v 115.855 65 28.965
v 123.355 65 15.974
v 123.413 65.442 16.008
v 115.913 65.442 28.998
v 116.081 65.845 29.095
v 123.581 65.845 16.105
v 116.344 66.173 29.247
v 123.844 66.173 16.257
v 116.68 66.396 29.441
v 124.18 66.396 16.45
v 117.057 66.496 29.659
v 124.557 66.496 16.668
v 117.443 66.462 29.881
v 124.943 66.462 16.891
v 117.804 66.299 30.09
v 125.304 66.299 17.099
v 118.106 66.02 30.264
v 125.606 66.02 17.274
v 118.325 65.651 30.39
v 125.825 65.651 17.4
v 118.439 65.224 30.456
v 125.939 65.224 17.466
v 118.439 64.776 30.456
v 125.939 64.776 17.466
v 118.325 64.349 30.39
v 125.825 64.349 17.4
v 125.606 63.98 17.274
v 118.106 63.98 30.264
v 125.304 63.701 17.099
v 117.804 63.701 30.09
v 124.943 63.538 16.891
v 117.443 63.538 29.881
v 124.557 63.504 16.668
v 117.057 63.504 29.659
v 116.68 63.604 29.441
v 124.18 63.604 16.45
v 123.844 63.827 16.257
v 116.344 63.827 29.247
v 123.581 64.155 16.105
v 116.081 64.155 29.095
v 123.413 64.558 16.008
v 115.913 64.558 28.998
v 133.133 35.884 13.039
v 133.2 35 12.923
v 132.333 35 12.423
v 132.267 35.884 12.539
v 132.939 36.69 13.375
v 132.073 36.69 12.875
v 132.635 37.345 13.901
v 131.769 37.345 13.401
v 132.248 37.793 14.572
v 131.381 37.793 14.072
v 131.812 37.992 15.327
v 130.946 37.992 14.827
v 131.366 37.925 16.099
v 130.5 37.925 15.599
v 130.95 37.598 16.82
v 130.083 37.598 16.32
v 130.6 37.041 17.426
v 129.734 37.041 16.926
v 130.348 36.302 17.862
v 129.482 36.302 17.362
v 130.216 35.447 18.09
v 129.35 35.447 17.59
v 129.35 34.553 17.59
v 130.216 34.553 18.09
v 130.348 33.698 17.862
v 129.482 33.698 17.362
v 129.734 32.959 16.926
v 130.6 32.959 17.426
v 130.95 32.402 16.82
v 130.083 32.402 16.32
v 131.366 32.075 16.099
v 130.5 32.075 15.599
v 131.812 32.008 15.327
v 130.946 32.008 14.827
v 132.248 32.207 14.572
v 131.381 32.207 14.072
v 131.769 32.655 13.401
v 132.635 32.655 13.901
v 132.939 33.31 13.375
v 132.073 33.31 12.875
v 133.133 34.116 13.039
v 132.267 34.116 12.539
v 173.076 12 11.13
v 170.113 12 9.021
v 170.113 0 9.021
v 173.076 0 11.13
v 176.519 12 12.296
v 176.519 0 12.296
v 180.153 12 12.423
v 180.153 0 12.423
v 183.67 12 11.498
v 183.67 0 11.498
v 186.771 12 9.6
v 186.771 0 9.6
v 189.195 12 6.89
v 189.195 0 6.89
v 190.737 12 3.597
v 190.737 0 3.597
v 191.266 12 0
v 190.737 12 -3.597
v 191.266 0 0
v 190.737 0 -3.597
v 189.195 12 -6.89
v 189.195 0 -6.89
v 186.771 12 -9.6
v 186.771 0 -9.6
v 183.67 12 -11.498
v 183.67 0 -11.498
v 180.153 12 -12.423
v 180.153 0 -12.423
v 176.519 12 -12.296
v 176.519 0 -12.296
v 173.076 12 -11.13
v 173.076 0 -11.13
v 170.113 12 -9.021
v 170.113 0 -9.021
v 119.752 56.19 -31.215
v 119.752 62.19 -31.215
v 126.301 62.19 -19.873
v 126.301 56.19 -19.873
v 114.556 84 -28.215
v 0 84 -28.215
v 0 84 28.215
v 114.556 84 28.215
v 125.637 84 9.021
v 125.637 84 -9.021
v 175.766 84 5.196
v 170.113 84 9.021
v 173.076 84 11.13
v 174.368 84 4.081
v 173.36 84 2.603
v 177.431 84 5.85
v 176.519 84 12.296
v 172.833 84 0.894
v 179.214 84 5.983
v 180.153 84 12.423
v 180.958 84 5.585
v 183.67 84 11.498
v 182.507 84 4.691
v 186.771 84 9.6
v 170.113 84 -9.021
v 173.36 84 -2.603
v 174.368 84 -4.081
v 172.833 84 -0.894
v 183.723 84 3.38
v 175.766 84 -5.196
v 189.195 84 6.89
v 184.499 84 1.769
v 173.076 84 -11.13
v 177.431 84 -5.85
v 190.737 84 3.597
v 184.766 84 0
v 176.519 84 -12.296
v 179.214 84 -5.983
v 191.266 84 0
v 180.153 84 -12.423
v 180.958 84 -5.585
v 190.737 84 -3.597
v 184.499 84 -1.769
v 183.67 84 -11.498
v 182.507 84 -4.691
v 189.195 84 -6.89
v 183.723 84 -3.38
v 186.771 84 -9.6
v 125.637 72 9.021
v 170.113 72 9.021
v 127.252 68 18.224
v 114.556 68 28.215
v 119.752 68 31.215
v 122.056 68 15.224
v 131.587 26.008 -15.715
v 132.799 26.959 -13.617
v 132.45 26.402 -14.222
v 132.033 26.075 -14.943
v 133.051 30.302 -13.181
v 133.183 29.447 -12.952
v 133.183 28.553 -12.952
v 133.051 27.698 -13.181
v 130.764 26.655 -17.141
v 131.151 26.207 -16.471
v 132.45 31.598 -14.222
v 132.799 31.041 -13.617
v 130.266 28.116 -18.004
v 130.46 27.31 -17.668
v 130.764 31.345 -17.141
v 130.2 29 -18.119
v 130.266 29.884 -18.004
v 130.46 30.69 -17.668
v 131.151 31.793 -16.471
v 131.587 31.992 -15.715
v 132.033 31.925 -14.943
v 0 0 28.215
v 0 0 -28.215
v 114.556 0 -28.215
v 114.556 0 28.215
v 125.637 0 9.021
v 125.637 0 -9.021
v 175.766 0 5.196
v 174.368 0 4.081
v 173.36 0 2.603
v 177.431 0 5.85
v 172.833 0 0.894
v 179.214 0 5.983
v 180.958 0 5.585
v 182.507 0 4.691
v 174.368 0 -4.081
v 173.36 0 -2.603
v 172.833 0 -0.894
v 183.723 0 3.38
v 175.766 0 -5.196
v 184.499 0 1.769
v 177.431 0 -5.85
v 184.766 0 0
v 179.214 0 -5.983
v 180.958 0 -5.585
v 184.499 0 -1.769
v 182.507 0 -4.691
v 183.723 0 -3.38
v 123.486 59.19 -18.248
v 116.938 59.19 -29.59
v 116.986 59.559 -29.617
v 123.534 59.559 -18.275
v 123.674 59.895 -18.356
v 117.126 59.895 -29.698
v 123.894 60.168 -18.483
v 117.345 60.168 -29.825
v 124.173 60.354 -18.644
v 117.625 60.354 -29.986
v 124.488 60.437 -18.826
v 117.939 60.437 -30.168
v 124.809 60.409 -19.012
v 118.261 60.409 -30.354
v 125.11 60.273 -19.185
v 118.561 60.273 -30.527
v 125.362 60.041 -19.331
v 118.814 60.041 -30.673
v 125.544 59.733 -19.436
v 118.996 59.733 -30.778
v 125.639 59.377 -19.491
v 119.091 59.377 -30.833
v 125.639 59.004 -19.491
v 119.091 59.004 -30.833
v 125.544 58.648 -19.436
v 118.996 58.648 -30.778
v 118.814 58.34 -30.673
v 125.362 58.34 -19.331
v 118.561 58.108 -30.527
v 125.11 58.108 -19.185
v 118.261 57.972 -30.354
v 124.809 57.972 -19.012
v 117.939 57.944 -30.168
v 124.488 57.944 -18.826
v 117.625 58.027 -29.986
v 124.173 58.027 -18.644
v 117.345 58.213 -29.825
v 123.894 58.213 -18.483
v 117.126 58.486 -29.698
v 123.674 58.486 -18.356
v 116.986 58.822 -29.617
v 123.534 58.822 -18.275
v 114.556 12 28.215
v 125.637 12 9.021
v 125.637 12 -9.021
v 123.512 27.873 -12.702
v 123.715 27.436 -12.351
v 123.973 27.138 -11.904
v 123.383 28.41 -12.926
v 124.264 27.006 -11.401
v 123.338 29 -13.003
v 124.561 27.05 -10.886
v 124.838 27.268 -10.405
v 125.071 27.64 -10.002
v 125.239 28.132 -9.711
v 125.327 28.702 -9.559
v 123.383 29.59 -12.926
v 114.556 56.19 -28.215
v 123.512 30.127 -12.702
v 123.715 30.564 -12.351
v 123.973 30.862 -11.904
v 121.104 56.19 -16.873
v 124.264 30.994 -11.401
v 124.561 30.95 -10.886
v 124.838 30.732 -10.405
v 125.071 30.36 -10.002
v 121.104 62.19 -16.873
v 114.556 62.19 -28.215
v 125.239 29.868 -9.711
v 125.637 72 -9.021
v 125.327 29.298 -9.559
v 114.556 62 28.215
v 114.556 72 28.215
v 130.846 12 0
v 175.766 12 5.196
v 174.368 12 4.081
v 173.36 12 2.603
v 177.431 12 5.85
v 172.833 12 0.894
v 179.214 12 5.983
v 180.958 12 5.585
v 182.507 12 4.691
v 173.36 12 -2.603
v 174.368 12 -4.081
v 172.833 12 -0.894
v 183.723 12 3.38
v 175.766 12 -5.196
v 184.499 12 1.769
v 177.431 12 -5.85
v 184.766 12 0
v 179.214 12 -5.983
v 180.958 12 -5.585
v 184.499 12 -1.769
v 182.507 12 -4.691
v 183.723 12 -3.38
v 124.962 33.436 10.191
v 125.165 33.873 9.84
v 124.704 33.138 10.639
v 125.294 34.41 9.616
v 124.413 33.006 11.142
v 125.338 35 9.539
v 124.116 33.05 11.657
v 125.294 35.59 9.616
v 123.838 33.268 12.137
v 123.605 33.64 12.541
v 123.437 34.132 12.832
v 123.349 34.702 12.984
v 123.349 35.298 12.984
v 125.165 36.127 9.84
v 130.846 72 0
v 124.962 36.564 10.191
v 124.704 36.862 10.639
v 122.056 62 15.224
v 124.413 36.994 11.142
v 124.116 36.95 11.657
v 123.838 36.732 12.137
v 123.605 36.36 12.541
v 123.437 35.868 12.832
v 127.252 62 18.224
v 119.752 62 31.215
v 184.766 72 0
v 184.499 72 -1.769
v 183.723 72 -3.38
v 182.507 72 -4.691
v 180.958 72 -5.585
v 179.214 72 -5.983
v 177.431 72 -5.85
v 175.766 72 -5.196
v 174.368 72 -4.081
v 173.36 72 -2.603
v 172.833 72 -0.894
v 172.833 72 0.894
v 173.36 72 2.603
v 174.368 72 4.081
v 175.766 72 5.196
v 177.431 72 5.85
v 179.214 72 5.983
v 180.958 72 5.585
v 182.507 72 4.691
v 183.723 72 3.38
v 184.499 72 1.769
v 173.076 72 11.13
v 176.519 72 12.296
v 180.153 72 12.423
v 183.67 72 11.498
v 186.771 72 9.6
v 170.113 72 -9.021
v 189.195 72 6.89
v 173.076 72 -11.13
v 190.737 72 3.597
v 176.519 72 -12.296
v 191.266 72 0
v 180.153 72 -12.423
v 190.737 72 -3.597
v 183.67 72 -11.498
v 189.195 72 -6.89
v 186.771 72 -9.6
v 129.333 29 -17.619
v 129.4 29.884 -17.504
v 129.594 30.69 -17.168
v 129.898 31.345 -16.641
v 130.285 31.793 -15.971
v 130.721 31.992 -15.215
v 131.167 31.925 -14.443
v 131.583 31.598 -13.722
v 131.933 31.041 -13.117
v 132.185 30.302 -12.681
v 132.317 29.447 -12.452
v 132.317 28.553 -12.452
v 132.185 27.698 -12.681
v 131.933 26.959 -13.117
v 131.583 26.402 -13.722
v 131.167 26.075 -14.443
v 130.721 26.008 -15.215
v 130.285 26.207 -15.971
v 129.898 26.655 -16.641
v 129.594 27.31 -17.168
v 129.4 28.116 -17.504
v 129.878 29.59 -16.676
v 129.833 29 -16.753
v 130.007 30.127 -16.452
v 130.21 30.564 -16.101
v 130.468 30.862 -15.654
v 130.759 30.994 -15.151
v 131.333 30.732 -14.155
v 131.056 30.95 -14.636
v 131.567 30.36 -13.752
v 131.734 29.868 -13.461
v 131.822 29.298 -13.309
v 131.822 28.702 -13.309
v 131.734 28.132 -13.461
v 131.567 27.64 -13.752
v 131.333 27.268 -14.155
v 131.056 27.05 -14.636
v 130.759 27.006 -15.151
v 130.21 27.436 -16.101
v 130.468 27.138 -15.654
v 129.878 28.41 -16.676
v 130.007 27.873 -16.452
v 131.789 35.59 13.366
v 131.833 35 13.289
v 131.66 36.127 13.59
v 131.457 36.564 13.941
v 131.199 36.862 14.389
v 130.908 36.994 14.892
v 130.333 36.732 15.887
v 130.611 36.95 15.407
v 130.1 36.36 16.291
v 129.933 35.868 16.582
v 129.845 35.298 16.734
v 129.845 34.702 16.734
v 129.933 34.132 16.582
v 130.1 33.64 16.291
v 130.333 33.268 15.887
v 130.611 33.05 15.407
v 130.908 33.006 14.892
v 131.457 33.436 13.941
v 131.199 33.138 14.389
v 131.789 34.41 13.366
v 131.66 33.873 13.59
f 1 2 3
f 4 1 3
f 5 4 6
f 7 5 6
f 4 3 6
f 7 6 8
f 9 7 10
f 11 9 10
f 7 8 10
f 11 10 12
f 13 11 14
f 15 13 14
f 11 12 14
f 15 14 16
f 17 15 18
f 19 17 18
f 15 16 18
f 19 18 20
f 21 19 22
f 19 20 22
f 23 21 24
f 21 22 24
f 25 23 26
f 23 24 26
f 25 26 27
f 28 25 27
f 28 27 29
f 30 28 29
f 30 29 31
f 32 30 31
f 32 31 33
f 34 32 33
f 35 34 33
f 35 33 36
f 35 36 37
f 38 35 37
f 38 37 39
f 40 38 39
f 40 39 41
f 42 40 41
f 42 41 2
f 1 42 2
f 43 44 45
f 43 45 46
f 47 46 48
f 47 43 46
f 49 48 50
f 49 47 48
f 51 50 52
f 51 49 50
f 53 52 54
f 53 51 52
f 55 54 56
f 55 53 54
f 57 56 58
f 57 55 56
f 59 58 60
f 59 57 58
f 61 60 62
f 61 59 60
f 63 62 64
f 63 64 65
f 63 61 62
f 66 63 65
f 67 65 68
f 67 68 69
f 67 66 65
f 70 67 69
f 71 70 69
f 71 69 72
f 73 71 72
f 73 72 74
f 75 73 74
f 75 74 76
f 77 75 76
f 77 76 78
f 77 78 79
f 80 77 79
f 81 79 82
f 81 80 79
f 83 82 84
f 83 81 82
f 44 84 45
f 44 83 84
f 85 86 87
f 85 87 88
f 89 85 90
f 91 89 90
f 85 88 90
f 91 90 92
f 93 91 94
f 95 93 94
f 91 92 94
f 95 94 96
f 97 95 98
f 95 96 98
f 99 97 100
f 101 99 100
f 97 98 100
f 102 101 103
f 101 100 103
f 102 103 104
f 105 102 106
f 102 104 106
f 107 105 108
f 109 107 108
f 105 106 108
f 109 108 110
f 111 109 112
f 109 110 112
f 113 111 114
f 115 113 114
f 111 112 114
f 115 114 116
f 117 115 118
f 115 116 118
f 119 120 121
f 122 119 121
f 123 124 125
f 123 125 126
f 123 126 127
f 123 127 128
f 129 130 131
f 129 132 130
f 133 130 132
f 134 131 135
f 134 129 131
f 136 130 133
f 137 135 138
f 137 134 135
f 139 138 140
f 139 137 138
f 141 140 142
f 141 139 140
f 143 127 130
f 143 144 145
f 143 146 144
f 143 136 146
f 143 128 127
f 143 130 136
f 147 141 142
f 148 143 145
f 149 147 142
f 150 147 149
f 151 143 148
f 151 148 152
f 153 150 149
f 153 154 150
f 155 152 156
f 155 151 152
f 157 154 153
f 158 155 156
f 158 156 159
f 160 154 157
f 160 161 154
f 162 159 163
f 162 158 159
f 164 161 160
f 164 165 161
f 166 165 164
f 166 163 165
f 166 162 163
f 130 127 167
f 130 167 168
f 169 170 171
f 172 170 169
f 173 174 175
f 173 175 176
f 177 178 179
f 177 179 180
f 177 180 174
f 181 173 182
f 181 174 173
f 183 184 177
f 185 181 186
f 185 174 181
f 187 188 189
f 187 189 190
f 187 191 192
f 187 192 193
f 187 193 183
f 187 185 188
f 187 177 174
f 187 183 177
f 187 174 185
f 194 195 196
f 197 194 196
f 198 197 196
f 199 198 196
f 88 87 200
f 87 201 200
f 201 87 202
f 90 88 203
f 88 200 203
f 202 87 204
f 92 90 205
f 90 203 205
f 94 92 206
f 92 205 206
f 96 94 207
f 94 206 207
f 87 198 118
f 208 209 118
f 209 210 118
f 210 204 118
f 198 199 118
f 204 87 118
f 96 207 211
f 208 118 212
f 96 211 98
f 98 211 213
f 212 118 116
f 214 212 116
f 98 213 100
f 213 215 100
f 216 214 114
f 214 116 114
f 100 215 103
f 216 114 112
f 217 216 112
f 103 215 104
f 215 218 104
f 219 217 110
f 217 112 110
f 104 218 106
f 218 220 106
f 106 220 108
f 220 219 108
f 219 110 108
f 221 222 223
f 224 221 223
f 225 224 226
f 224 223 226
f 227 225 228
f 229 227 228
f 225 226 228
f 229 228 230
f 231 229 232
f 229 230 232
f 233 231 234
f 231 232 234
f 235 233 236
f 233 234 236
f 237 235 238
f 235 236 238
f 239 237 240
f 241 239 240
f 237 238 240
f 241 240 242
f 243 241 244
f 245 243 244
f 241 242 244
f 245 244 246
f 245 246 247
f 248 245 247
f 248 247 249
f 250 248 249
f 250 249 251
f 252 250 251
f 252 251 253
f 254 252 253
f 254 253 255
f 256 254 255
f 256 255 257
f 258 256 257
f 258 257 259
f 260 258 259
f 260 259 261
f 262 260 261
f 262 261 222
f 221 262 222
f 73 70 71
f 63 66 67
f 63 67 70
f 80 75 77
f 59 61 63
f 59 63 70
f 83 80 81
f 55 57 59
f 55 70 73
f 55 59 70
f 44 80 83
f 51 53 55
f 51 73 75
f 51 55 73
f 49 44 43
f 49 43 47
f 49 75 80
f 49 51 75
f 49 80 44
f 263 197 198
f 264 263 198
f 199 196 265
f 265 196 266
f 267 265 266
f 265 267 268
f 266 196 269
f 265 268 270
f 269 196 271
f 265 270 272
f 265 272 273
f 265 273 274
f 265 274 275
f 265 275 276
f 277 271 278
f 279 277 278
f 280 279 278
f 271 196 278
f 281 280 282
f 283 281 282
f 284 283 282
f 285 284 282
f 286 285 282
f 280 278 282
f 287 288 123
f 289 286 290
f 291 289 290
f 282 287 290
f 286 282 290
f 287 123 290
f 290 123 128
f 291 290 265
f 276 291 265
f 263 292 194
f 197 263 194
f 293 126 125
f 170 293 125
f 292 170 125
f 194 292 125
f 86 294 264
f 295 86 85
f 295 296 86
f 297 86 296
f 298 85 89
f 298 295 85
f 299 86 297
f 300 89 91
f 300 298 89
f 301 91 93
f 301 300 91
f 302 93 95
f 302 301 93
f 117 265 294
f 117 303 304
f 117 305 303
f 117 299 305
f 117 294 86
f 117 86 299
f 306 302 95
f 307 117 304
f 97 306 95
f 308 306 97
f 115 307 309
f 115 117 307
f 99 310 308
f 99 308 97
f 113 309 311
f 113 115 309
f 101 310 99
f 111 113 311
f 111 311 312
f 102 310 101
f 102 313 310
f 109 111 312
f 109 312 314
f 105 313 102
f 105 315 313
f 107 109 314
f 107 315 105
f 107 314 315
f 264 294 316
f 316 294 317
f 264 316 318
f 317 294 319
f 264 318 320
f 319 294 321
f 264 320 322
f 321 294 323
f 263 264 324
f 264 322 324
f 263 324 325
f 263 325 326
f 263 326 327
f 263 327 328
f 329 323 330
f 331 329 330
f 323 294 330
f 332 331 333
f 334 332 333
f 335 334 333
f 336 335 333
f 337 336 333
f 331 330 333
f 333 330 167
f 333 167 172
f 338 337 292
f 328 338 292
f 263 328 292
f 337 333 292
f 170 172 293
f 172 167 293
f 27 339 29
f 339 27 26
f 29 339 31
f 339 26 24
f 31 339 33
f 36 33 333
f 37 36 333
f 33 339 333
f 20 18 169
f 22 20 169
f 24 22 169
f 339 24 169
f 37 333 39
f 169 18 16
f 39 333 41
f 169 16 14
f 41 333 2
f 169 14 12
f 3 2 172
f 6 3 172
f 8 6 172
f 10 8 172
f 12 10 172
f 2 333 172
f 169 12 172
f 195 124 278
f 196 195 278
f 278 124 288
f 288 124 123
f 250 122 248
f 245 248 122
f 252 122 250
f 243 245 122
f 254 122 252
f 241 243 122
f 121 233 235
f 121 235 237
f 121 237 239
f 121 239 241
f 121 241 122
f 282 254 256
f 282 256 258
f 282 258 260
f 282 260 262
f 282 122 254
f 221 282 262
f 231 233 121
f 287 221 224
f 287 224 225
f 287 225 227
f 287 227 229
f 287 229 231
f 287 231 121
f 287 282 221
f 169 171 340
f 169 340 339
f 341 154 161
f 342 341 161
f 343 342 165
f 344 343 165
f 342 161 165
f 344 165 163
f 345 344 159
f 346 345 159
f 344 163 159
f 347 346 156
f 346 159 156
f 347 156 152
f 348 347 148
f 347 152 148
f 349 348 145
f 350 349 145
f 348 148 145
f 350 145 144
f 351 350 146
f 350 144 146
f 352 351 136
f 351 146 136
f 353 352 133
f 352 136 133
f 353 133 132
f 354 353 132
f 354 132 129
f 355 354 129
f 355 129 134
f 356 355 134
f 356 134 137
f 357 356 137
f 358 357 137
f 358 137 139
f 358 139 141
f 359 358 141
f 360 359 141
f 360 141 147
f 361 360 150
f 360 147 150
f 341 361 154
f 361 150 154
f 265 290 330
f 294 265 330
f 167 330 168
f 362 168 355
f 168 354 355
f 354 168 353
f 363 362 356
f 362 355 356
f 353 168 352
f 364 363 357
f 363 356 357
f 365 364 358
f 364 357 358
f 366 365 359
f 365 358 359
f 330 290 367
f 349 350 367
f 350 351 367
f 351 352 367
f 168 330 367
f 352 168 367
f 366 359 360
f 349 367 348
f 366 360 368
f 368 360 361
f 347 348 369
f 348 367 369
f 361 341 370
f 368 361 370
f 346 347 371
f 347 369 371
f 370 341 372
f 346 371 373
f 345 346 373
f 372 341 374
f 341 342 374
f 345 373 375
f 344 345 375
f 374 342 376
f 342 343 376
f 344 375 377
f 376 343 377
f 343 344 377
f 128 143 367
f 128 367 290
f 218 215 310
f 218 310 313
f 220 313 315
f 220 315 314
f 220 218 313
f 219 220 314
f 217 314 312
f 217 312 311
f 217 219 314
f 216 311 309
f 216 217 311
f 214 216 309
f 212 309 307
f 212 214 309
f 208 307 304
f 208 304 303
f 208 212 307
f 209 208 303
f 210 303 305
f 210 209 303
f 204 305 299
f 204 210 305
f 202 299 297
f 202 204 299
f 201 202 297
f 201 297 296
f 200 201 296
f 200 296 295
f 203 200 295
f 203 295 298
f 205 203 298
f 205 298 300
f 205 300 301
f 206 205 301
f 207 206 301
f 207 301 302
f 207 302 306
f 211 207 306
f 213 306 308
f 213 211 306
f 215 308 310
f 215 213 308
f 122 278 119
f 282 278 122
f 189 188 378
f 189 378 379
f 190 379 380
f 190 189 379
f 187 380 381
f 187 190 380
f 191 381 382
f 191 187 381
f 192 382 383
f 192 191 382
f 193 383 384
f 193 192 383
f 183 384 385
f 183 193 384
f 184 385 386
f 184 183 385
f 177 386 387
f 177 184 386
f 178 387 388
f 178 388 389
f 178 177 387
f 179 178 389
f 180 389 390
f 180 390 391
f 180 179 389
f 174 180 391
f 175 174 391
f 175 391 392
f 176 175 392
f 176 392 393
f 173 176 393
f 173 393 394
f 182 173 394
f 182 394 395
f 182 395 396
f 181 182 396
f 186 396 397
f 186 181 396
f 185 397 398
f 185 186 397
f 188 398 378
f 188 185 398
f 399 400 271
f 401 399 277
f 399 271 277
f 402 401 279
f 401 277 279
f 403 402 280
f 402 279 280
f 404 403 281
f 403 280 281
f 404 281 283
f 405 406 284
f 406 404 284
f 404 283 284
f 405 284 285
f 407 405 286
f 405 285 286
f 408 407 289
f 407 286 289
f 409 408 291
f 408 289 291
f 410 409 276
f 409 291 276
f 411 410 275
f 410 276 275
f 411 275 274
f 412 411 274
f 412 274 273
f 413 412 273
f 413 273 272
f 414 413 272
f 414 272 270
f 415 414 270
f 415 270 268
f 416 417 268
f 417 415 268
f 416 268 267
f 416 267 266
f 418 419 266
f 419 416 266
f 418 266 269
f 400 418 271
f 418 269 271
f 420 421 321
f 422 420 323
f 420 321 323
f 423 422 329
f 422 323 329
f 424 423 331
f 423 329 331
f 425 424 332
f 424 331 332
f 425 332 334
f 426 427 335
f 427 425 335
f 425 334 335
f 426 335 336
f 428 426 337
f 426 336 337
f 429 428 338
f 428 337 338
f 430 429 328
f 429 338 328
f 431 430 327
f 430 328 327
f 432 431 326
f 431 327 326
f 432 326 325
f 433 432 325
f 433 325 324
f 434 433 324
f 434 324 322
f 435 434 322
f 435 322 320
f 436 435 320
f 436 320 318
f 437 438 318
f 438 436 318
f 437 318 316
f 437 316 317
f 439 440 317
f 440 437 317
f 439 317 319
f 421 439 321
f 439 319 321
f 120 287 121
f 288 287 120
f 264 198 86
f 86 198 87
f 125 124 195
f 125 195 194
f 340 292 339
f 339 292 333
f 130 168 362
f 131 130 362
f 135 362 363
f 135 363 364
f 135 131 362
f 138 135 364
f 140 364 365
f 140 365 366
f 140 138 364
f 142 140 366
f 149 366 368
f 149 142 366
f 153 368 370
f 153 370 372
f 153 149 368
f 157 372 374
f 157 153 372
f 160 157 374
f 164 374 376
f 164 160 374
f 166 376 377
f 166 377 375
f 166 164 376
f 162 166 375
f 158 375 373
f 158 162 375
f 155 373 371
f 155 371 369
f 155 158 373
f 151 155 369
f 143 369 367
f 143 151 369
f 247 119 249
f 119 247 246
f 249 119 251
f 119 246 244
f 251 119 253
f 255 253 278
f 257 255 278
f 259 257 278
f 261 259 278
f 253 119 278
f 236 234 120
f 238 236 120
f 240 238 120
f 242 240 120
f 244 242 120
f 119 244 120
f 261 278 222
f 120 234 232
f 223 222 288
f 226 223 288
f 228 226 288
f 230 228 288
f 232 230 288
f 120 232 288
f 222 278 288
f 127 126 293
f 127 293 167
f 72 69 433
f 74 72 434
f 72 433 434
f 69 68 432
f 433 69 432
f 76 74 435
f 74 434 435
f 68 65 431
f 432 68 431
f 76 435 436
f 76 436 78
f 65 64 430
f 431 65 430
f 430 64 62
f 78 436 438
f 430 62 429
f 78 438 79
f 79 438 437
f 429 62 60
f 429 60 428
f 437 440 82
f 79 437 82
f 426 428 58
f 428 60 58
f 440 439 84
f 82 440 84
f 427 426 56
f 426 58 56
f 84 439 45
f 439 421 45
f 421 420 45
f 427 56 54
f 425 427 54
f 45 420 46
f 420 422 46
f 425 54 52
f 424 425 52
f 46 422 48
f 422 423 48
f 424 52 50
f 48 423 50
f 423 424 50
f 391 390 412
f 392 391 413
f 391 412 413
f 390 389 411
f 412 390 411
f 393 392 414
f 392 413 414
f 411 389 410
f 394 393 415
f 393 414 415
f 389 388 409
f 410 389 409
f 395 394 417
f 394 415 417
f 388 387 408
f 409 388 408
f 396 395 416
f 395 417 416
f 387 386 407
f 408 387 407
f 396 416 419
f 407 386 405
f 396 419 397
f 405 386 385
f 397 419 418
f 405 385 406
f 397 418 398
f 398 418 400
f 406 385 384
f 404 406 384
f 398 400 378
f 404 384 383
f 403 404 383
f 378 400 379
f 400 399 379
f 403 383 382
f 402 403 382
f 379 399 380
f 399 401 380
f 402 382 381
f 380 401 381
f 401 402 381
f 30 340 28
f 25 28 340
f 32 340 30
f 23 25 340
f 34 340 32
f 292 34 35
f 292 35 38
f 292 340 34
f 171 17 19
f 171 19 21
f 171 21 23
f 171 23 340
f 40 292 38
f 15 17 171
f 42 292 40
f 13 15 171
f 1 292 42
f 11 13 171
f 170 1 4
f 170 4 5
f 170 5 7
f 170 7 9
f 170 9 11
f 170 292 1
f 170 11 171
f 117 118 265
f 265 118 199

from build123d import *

# Parameters (mm, degrees)
SKETCH4_R            = 6
BOSS_EXTRUDE2_DEPTH  = 12
BOSS_EXTRUDE3_DEPTH  = 30
SKETCH16_R           = 2
BOSS_EXTRUDE9_DEPTH  = 8.5
SKETCH17_R           = 2
BOSS_EXTRUDE10_DEPTH = 8.5
BOSS_EXTRUDE11_DEPTH = 6
SKETCH20_W           = 15
SKETCH20_H           = 6
BOSS_EXTRUDE12_DEPTH = 6
SKETCH22_R           = 3
BOSS_EXTRUDE13_DEPTH = 1
SKETCH23_R           = 3
BOSS_EXTRUDE14_DEPTH = 1
SKETCH27_R           = 1.25
CUT_EXTRUDE4_DEPTH   = 16
SKETCH28_R           = 1.5
CUT_EXTRUDE5_DEPTH   = 17


with BuildPart() as part:
    # Sketch4 → Boss-Extrude2 (new body)
    with BuildSketch(Plane(origin=(0, 0, 0), x_dir=(1, 0, 0), z_dir=(0, 1, 0))):
        with BuildLine():
            Line((0, 28.214565602), (0, -28.214565602))
            Line((0, -28.214565602), (114.556109318, -28.214565602))
            Line((114.556109318, -28.214565602), (125.637290842, -9.021396193))
            Line((125.637290842, -9.021396193), (170.11344646, -9.021396193))
            ThreePointArc((170.11344646, -9.021396193), (191.265868706, 0), (170.11344646, 9.021396193))
            Line((170.11344646, 9.021396193), (125.637290842, 9.021396193))
            Line((125.637290842, 9.021396193), (114.556109318, 28.214565602))
            Line((114.556109318, 28.214565602), (0, 28.214565602))
        make_face()
        with Locations((178.765868706, 0)):
            Circle(SKETCH4_R, mode=Mode.SUBTRACT)
    extrude(amount=BOSS_EXTRUDE2_DEPTH)

    # Sketch6 → Boss-Extrude3 (add)
    with BuildSketch(Plane(origin=(0, 12, 0), x_dir=(1, 0, 0), z_dir=(0, 1, 0))):
        Polygon((0, 0), (0, 28.214565602), (114.556109318, 28.214565602), (125.637290842, 9.021396193), (130.845796363, 0), (114.556109318, -28.214565602), (0, -28.214565602), align=None)
    extrude(amount=BOSS_EXTRUDE3_DEPTH)

    # Mirror5: part across plane


with BuildPart() as part_1:
    add(part.part)
    add(part.part.mirror(Plane(origin=(0, 42, 0), x_dir=(0, 0, 1), z_dir=(0, -1, 0))))

    # Sketch16 → Boss-Extrude9 (add)
    with BuildSketch(Plane(origin=(98.134347272, 0, -56.657891814), x_dir=(-0.5, 0, -0.866025404), z_dir=(0.866025404, 0, -0.5))):
        with Locations((-52.407887359, 29)):
            Circle(SKETCH16_R)
    extrude(amount=BOSS_EXTRUDE9_DEPTH)

    # Sketch17 → Boss-Extrude10 (add)
    with BuildSketch(Plane(origin=(98.134347272, 0, 56.657891814), x_dir=(0.5, 0, -0.866025404), z_dir=(0.866025404, 0, 0.5))):
        with Locations((52.407887359, 35)):
            Circle(SKETCH17_R)
    extrude(amount=BOSS_EXTRUDE10_DEPTH)

    # Sketch18 → Boss-Extrude11 (add)
    with BuildSketch(Plane(origin=(98.134347272, 0, -56.657891814), x_dir=(-0.5, 0, -0.866025404), z_dir=(0.866025404, 0, -0.5))):
        Polygon((-32.843524091, 59), (-32.843524091, 56.190441435), (-45.940020371, 56.190441435), (-45.940020371, 62.190441435), (-32.843524091, 62.190441435), align=None)
    extrude(amount=BOSS_EXTRUDE11_DEPTH)

    # Sketch20 → Boss-Extrude12 (add)
    with BuildSketch(Plane(origin=(98.134347272, 0, 56.657891814), x_dir=(0.5, 0, -0.866025404), z_dir=(0.866025404, 0, 0.5))):
        with Locations((40.343524091, 65)):
            Rectangle(SKETCH20_W, SKETCH20_H)
    extrude(amount=BOSS_EXTRUDE12_DEPTH)

    # Sketch22 → Boss-Extrude13 (add)
    with BuildSketch(Plane(origin=(105.495563204, 0, -60.907891814), x_dir=(-0.5, 0, -0.866025404), z_dir=(0.866025404, 0, -0.5))):
        with Locations((-52.407887359, 29)):
            Circle(SKETCH22_R)
    extrude(amount=-BOSS_EXTRUDE13_DEPTH)

    # Sketch23 → Boss-Extrude14 (add)
    with BuildSketch(Plane(origin=(105.495563204, 0, 60.907891814), x_dir=(0.5, 0, -0.866025404), z_dir=(0.866025404, 0, 0.5))):
        with Locations((52.407887359, 35)):
            Circle(SKETCH23_R)
    extrude(amount=-BOSS_EXTRUDE14_DEPTH)

    # Sketch27 → Cut-Extrude4 (cut)
    with BuildSketch(Plane(origin=(16.421762045, 0, 28.443326212), x_dir=(-0.866025404, 0, 0.5), z_dir=(-0.5, 0, -0.866025404))):
        with Locations((-117.315783629, 59.190441435)):
            Circle(SKETCH27_R)
    extrude(amount=-CUT_EXTRUDE4_DEPTH, mode=Mode.SUBTRACT)

    # Sketch28 → Cut-Extrude5 (cut)
    with BuildSketch(Plane(origin=(23.921762045, 0, -41.433707269), x_dir=(-0.866025404, 0, -0.5), z_dir=(0.5, 0, -0.866025404))):
        with Locations((-116.315783629, 65)):
            Circle(SKETCH28_R)
    extrude(amount=-CUT_EXTRUDE5_DEPTH, mode=Mode.SUBTRACT)


solid = part_1.part
